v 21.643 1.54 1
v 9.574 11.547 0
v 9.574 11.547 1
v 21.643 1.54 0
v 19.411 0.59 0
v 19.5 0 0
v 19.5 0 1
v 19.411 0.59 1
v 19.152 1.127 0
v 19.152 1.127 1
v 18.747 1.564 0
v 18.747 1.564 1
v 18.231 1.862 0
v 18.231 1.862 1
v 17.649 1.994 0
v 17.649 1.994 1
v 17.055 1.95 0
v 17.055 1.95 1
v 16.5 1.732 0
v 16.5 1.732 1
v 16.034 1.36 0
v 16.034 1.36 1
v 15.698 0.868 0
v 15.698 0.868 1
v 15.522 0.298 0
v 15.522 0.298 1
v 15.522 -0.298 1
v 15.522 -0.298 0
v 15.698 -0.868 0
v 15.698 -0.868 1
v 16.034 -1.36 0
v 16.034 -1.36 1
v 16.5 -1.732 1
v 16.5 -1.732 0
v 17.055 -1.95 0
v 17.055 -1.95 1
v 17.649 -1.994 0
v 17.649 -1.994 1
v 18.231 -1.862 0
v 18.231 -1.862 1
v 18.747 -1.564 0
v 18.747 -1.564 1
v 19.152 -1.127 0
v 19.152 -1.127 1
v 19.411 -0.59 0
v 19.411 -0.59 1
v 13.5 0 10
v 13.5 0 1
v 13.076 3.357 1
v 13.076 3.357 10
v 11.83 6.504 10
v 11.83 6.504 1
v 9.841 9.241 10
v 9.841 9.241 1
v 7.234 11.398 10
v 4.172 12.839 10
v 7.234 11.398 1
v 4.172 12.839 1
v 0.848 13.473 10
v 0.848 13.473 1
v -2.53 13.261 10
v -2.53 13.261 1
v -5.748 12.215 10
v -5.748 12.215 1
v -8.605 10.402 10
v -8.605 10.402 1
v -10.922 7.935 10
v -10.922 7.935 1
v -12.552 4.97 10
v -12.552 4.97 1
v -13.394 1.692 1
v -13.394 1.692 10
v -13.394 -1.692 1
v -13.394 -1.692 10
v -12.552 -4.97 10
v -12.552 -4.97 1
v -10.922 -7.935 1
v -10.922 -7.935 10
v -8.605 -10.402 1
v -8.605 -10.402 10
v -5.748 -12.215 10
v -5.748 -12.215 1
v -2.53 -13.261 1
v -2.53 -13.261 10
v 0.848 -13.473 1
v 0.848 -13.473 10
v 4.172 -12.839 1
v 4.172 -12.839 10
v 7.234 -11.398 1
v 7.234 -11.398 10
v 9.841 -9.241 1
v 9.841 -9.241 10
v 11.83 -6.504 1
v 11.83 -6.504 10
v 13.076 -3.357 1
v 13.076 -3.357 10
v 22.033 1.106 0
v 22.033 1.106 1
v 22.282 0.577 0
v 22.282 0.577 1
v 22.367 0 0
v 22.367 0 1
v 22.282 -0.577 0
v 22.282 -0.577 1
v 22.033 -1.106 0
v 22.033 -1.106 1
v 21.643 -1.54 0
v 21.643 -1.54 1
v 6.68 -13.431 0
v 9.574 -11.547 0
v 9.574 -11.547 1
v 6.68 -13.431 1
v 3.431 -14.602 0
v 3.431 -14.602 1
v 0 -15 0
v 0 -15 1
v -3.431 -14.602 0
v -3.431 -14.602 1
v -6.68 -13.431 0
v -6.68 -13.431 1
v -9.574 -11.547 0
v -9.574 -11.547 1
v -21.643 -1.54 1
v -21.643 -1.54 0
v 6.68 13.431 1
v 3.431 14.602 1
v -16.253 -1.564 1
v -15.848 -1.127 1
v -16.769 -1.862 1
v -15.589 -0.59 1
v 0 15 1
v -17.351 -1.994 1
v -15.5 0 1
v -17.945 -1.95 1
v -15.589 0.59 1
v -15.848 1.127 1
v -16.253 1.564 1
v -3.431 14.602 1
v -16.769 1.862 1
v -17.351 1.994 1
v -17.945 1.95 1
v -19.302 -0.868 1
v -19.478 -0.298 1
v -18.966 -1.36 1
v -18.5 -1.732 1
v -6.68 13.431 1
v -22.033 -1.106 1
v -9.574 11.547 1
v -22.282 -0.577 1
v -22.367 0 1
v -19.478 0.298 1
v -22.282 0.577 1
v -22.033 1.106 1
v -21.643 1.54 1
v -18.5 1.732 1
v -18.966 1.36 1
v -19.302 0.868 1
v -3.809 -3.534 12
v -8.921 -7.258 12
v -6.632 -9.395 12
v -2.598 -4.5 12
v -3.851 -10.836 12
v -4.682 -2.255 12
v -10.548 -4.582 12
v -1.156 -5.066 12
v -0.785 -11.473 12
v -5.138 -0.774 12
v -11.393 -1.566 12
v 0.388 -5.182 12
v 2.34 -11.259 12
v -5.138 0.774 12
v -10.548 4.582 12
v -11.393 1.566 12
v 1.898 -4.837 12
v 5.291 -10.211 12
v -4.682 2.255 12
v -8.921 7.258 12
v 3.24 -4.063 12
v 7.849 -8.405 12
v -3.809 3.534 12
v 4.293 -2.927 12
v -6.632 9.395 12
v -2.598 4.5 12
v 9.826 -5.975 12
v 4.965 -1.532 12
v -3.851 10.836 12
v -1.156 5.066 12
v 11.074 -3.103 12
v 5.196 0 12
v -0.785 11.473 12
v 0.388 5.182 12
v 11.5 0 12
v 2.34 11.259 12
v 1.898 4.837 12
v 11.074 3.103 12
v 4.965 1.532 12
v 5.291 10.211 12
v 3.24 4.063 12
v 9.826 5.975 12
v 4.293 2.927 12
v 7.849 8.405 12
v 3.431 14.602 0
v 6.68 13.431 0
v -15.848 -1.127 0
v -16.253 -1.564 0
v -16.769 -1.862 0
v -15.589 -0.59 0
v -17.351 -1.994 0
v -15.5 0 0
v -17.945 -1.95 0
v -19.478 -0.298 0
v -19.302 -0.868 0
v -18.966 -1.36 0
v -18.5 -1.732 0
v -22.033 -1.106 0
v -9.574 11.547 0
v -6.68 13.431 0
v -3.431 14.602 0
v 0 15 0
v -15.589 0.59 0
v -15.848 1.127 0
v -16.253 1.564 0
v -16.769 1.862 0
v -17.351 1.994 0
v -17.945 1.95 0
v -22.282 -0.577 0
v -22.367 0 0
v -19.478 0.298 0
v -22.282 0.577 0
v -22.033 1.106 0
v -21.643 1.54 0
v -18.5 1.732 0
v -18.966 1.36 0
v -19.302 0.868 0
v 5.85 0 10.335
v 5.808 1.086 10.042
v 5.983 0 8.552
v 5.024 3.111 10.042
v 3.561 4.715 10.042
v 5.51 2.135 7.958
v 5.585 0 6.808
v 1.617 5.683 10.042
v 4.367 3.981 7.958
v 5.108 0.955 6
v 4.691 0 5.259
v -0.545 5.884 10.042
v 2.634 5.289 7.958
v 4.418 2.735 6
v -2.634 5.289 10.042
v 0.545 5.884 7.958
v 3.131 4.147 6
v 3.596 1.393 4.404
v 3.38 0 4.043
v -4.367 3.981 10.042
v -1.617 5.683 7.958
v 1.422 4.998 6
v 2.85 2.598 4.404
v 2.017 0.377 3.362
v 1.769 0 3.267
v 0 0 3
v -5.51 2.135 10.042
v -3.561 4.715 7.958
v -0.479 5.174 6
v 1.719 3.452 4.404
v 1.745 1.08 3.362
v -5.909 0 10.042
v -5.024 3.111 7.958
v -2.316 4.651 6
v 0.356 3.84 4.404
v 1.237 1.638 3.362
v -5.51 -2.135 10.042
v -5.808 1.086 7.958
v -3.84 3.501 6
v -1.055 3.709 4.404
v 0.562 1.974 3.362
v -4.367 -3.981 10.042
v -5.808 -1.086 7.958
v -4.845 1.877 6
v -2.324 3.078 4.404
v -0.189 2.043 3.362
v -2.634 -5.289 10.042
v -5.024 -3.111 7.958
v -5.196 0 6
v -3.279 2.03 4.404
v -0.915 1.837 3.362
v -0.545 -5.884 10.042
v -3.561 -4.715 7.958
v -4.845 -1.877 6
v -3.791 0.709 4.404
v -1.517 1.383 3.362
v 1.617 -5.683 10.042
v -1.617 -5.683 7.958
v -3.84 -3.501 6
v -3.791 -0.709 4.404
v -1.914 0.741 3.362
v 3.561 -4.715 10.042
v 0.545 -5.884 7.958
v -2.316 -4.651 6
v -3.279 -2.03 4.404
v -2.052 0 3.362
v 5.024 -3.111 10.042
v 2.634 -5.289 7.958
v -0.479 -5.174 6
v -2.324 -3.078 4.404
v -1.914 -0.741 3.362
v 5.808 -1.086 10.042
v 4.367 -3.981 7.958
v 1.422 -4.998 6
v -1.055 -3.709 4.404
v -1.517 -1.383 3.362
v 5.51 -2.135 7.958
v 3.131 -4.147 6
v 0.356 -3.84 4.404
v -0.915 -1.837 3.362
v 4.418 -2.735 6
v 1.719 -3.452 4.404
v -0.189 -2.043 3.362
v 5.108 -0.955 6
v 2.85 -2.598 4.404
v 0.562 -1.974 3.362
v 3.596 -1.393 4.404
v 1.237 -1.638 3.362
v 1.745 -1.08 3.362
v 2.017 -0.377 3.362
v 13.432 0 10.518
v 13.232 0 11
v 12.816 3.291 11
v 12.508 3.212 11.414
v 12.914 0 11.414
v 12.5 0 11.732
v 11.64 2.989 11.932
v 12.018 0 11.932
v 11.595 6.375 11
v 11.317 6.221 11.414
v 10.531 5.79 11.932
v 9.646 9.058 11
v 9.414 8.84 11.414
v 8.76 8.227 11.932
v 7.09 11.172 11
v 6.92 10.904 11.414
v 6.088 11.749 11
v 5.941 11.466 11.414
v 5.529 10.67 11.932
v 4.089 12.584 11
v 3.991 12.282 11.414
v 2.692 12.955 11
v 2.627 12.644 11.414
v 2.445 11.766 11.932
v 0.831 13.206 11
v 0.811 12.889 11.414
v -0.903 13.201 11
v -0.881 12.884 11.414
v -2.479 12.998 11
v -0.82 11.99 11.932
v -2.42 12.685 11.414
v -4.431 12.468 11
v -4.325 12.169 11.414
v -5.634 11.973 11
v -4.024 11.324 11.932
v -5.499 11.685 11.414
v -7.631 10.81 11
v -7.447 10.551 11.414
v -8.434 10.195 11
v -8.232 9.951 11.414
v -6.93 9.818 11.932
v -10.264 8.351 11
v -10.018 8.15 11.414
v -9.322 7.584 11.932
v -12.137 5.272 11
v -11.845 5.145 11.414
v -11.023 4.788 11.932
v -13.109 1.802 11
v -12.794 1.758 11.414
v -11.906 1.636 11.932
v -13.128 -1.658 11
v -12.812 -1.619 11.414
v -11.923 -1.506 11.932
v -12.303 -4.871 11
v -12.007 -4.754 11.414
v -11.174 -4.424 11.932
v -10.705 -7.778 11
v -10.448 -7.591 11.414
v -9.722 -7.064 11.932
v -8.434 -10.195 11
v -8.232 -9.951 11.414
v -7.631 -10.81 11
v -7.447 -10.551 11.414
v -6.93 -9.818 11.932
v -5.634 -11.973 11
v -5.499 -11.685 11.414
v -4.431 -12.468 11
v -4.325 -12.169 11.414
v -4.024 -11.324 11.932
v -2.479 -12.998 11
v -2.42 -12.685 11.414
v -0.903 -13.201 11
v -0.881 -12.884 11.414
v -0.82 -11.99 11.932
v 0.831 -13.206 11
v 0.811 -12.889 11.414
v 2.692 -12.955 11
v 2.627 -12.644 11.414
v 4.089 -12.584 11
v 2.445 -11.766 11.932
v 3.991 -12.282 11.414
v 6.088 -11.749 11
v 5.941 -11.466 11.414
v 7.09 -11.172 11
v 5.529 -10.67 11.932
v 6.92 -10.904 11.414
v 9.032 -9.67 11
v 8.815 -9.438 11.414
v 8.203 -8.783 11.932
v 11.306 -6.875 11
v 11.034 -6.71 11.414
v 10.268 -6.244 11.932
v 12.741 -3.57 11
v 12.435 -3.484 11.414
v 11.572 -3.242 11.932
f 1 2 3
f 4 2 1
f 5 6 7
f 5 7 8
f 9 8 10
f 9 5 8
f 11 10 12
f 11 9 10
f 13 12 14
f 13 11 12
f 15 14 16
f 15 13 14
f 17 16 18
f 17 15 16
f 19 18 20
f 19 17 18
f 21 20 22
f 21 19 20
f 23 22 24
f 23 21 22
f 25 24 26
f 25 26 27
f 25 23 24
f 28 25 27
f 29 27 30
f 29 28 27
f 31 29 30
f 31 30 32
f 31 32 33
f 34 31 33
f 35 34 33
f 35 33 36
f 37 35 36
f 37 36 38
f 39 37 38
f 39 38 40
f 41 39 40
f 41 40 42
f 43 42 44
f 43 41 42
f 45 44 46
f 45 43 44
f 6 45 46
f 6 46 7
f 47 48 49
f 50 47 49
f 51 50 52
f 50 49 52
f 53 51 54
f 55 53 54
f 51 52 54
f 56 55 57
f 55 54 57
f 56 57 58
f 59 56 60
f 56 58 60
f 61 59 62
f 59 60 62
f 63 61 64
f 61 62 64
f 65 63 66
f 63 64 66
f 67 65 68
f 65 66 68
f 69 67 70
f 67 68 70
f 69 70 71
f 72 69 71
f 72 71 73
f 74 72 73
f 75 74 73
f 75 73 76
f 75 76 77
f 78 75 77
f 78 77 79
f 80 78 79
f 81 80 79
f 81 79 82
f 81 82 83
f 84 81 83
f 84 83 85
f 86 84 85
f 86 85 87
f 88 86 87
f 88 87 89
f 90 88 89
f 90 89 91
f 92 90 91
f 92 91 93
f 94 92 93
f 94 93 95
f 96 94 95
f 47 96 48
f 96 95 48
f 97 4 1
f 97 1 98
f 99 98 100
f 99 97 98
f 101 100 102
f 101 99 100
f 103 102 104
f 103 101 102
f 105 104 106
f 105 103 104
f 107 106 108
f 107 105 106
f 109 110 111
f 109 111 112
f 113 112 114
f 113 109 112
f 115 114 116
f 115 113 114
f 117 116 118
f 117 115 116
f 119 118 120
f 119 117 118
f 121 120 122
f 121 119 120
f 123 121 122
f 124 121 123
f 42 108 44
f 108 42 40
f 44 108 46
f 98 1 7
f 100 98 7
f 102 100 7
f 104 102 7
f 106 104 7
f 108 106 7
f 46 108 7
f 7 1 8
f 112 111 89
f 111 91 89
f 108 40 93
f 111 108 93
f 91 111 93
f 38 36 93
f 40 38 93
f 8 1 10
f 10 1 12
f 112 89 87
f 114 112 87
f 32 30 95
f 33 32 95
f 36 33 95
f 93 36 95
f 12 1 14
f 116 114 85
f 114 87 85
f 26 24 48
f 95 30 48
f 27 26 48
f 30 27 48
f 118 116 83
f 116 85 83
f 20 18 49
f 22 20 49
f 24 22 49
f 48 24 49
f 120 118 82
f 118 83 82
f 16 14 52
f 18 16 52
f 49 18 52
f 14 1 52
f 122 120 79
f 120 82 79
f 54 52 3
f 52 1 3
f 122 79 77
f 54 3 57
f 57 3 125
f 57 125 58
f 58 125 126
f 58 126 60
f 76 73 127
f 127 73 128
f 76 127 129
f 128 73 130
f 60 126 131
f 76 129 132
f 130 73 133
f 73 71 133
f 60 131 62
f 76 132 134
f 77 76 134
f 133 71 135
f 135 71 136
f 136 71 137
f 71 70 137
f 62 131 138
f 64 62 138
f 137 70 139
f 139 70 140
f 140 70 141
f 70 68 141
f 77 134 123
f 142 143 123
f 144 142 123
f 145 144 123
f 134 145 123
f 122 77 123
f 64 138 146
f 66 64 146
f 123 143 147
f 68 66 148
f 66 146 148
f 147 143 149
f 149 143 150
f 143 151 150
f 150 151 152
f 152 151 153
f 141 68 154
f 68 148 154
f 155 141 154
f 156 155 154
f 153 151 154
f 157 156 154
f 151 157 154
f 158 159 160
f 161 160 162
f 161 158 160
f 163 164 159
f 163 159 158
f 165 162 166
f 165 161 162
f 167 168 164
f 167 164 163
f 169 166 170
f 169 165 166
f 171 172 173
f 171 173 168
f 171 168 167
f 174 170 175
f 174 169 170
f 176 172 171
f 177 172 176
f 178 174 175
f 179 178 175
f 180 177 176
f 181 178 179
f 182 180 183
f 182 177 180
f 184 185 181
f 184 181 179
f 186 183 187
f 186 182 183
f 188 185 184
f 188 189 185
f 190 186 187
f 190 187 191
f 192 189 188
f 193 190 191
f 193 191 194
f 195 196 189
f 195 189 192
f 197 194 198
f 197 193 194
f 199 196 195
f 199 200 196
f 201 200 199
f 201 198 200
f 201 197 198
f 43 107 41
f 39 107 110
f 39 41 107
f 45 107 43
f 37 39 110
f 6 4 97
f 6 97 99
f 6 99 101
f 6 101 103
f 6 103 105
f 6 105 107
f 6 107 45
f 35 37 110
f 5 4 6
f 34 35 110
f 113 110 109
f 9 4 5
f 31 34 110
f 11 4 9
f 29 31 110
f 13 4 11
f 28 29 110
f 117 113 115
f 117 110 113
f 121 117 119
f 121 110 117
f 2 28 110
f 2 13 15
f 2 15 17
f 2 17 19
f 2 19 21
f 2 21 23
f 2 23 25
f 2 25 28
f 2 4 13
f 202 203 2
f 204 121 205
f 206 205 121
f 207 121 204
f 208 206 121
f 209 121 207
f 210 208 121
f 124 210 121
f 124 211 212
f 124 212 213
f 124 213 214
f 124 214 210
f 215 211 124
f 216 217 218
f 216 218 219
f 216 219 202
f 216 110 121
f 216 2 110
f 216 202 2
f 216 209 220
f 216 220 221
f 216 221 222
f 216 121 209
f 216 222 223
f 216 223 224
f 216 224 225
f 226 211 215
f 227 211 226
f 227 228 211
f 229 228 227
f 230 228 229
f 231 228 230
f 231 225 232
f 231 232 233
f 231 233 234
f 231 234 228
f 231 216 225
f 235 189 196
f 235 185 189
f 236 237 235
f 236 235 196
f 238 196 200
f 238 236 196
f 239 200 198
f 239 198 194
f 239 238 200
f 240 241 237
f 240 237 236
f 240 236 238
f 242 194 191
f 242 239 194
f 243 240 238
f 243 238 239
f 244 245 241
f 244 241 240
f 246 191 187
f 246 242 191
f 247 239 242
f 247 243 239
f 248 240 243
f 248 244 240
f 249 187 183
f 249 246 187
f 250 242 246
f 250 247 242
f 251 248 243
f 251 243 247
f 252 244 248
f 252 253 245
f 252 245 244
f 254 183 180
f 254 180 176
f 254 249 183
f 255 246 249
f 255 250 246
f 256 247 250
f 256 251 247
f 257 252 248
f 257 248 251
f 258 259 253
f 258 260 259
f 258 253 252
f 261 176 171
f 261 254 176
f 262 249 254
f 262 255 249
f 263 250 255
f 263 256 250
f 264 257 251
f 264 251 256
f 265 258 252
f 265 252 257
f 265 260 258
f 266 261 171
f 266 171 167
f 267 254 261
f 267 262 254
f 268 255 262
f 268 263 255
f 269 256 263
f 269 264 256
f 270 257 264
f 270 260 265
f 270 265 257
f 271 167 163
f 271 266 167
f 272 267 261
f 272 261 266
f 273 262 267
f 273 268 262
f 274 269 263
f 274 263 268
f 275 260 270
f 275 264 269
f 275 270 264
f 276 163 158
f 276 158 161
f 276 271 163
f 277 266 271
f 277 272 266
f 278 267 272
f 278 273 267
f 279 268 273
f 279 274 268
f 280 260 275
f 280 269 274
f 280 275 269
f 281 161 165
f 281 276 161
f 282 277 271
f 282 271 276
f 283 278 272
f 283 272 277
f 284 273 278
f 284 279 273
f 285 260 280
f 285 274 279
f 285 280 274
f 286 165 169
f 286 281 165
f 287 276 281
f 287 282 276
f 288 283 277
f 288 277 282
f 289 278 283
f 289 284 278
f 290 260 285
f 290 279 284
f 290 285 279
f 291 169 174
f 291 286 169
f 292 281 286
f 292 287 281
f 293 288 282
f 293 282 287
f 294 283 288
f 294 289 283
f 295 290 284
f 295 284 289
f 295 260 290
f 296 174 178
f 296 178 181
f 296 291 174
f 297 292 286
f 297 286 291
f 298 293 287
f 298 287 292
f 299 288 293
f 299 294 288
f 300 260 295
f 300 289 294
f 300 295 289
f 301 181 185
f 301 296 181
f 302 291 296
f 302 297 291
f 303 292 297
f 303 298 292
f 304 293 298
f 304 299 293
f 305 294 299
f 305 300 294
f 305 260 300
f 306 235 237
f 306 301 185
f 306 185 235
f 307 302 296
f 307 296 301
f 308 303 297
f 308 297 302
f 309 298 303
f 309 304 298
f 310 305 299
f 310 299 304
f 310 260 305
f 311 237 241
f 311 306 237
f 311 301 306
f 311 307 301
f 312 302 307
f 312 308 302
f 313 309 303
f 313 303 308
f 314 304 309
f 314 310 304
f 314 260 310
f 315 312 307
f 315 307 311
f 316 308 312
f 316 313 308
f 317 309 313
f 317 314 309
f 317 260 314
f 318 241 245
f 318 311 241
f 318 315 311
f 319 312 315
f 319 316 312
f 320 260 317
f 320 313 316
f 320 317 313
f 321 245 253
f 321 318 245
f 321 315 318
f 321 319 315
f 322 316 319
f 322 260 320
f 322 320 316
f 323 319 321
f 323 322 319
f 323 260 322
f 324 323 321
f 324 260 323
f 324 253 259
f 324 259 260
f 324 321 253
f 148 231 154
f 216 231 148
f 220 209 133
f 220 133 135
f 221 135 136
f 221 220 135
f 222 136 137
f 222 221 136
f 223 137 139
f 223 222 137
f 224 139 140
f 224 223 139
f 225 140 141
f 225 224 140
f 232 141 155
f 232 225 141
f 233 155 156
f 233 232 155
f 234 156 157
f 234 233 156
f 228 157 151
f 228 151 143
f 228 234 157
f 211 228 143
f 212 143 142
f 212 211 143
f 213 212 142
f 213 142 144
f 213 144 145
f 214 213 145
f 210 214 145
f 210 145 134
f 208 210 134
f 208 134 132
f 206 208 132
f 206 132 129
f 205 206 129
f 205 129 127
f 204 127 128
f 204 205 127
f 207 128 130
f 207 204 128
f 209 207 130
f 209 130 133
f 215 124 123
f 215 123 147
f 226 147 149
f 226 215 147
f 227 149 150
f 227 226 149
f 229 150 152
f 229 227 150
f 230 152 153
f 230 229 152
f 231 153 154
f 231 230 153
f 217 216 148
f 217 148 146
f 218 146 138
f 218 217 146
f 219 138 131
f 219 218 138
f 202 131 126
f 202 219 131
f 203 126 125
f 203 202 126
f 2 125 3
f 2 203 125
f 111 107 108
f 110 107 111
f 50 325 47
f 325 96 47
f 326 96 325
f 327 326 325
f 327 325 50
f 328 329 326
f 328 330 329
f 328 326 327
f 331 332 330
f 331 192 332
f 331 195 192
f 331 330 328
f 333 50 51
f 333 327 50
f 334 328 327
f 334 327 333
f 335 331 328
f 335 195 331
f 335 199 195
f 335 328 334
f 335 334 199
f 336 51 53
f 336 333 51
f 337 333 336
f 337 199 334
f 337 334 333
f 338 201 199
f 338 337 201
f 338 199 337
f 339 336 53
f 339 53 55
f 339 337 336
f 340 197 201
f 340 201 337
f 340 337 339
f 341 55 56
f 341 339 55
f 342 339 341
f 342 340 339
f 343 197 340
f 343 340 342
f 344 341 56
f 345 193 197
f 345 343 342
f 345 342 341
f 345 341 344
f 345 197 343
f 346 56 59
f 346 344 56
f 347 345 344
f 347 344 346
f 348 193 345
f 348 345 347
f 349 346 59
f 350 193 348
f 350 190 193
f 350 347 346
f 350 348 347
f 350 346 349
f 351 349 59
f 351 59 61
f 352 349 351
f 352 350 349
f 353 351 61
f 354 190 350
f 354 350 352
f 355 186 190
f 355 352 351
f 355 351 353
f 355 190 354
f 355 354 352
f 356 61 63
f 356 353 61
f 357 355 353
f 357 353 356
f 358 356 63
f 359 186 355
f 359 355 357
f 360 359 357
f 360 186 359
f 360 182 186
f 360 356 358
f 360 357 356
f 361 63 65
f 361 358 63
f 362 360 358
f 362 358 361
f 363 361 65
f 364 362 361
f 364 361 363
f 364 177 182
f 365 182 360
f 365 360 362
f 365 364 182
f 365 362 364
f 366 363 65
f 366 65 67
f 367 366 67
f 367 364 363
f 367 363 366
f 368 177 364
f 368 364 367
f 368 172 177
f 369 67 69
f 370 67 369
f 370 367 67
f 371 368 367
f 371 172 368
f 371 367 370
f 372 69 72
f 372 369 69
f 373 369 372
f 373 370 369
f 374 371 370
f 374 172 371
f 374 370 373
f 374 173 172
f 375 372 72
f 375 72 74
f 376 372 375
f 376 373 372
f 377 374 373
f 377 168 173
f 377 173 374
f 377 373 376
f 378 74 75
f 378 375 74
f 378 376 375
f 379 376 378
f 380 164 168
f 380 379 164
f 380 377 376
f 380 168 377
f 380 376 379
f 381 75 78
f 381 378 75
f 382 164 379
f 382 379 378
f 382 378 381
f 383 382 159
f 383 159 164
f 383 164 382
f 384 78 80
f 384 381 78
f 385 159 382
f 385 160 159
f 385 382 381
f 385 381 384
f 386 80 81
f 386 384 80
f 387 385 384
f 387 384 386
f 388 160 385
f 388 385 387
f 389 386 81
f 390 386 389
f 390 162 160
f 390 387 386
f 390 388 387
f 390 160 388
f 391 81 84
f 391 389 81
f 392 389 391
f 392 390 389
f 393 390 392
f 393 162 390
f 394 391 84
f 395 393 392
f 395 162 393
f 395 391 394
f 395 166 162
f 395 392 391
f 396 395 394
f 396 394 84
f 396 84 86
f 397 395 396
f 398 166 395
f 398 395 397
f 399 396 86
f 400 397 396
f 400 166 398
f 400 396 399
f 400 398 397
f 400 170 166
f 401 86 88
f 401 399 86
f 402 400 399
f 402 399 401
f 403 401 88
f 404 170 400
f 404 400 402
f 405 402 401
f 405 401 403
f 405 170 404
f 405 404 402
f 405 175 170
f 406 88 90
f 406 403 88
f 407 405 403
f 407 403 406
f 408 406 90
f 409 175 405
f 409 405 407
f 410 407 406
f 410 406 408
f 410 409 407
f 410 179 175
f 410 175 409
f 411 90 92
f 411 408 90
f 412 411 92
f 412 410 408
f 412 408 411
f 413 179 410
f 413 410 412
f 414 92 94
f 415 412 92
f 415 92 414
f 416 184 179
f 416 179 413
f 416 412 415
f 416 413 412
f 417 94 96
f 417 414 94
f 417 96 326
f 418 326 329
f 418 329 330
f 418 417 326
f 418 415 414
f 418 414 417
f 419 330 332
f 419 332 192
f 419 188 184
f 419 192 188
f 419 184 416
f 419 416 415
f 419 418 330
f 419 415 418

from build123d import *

# Parameters (mm, degrees)
SKETCH_1_R      = 13.5
SKETCH_1_R_2    = 2
EXTRUDE_3_DEPTH = 1
SKETCH_3_R      = 13.5
EXTRUDE_4_DEPTH = 12
FILLET_3_R      = 2


with BuildPart() as part:
    # 草图1 → 凸台-拉伸3 (new body)
    with BuildSketch(Plane.XY):
        with BuildLine():
            Line((-21.643262411, 1.539578937), (-9.574468085, 11.546842031))
            ThreePointArc((-9.574468085, 11.546842031), (0, 15), (9.574468085, 11.546842031))
            Line((9.574468085, 11.546842031), (21.643262411, 1.539578937))
            ThreePointArc((21.643262411, 1.539578937), (22.366666667, 0), (21.643262411, -1.539578937))
            Line((21.643262411, -1.539578937), (9.574468085, -11.546842031))
            ThreePointArc((9.574468085, -11.546842031), (0, -15), (-9.574468085, -11.546842031))
            Line((-9.574468085, -11.546842031), (-21.643262411, -1.539578937))
            ThreePointArc((-21.643262411, -1.539578937), (-22.366666667, 0), (-21.643262411, 1.539578937))
        make_face()
        Circle(SKETCH_1_R, mode=Mode.SUBTRACT)
        with Locations((-17.5, 0)):
            Circle(SKETCH_1_R_2, mode=Mode.SUBTRACT)
        with Locations((17.5, 0)):
            Circle(SKETCH_1_R_2, mode=Mode.SUBTRACT)
    extrude(amount=EXTRUDE_3_DEPTH)

    # 草图3 → 凸台-拉伸4 (add)
    with BuildSketch(Plane.XY):
        Circle(SKETCH_3_R)
    extrude(amount=EXTRUDE_4_DEPTH)

    # 圆角3
    fillet_3_edges = [part.edges().sort_by_distance(p)[0] for p in [
        (-13.5, 0, 12),
    ]]
    fillet(fillet_3_edges, radius=FILLET_3_R)

    # 草图4 → 切除-旋转9 (revolve, cut)
    with BuildSketch(Plane(origin=(0, 0, 0), x_dir=(1, 0, 0), z_dir=(0, 1, 0))):
        with BuildLine():
            Line((0, -12), (5.196152423, -12))
            ThreePointArc((5.196152423, -12), (5.196152423, -6), (0, -3))
            Line((0, -3), (0, -12))
        make_face()
    revolve(axis=Axis((0, 0, 0), (0, 0, 1)), mode=Mode.SUBTRACT)


solid = part.part
